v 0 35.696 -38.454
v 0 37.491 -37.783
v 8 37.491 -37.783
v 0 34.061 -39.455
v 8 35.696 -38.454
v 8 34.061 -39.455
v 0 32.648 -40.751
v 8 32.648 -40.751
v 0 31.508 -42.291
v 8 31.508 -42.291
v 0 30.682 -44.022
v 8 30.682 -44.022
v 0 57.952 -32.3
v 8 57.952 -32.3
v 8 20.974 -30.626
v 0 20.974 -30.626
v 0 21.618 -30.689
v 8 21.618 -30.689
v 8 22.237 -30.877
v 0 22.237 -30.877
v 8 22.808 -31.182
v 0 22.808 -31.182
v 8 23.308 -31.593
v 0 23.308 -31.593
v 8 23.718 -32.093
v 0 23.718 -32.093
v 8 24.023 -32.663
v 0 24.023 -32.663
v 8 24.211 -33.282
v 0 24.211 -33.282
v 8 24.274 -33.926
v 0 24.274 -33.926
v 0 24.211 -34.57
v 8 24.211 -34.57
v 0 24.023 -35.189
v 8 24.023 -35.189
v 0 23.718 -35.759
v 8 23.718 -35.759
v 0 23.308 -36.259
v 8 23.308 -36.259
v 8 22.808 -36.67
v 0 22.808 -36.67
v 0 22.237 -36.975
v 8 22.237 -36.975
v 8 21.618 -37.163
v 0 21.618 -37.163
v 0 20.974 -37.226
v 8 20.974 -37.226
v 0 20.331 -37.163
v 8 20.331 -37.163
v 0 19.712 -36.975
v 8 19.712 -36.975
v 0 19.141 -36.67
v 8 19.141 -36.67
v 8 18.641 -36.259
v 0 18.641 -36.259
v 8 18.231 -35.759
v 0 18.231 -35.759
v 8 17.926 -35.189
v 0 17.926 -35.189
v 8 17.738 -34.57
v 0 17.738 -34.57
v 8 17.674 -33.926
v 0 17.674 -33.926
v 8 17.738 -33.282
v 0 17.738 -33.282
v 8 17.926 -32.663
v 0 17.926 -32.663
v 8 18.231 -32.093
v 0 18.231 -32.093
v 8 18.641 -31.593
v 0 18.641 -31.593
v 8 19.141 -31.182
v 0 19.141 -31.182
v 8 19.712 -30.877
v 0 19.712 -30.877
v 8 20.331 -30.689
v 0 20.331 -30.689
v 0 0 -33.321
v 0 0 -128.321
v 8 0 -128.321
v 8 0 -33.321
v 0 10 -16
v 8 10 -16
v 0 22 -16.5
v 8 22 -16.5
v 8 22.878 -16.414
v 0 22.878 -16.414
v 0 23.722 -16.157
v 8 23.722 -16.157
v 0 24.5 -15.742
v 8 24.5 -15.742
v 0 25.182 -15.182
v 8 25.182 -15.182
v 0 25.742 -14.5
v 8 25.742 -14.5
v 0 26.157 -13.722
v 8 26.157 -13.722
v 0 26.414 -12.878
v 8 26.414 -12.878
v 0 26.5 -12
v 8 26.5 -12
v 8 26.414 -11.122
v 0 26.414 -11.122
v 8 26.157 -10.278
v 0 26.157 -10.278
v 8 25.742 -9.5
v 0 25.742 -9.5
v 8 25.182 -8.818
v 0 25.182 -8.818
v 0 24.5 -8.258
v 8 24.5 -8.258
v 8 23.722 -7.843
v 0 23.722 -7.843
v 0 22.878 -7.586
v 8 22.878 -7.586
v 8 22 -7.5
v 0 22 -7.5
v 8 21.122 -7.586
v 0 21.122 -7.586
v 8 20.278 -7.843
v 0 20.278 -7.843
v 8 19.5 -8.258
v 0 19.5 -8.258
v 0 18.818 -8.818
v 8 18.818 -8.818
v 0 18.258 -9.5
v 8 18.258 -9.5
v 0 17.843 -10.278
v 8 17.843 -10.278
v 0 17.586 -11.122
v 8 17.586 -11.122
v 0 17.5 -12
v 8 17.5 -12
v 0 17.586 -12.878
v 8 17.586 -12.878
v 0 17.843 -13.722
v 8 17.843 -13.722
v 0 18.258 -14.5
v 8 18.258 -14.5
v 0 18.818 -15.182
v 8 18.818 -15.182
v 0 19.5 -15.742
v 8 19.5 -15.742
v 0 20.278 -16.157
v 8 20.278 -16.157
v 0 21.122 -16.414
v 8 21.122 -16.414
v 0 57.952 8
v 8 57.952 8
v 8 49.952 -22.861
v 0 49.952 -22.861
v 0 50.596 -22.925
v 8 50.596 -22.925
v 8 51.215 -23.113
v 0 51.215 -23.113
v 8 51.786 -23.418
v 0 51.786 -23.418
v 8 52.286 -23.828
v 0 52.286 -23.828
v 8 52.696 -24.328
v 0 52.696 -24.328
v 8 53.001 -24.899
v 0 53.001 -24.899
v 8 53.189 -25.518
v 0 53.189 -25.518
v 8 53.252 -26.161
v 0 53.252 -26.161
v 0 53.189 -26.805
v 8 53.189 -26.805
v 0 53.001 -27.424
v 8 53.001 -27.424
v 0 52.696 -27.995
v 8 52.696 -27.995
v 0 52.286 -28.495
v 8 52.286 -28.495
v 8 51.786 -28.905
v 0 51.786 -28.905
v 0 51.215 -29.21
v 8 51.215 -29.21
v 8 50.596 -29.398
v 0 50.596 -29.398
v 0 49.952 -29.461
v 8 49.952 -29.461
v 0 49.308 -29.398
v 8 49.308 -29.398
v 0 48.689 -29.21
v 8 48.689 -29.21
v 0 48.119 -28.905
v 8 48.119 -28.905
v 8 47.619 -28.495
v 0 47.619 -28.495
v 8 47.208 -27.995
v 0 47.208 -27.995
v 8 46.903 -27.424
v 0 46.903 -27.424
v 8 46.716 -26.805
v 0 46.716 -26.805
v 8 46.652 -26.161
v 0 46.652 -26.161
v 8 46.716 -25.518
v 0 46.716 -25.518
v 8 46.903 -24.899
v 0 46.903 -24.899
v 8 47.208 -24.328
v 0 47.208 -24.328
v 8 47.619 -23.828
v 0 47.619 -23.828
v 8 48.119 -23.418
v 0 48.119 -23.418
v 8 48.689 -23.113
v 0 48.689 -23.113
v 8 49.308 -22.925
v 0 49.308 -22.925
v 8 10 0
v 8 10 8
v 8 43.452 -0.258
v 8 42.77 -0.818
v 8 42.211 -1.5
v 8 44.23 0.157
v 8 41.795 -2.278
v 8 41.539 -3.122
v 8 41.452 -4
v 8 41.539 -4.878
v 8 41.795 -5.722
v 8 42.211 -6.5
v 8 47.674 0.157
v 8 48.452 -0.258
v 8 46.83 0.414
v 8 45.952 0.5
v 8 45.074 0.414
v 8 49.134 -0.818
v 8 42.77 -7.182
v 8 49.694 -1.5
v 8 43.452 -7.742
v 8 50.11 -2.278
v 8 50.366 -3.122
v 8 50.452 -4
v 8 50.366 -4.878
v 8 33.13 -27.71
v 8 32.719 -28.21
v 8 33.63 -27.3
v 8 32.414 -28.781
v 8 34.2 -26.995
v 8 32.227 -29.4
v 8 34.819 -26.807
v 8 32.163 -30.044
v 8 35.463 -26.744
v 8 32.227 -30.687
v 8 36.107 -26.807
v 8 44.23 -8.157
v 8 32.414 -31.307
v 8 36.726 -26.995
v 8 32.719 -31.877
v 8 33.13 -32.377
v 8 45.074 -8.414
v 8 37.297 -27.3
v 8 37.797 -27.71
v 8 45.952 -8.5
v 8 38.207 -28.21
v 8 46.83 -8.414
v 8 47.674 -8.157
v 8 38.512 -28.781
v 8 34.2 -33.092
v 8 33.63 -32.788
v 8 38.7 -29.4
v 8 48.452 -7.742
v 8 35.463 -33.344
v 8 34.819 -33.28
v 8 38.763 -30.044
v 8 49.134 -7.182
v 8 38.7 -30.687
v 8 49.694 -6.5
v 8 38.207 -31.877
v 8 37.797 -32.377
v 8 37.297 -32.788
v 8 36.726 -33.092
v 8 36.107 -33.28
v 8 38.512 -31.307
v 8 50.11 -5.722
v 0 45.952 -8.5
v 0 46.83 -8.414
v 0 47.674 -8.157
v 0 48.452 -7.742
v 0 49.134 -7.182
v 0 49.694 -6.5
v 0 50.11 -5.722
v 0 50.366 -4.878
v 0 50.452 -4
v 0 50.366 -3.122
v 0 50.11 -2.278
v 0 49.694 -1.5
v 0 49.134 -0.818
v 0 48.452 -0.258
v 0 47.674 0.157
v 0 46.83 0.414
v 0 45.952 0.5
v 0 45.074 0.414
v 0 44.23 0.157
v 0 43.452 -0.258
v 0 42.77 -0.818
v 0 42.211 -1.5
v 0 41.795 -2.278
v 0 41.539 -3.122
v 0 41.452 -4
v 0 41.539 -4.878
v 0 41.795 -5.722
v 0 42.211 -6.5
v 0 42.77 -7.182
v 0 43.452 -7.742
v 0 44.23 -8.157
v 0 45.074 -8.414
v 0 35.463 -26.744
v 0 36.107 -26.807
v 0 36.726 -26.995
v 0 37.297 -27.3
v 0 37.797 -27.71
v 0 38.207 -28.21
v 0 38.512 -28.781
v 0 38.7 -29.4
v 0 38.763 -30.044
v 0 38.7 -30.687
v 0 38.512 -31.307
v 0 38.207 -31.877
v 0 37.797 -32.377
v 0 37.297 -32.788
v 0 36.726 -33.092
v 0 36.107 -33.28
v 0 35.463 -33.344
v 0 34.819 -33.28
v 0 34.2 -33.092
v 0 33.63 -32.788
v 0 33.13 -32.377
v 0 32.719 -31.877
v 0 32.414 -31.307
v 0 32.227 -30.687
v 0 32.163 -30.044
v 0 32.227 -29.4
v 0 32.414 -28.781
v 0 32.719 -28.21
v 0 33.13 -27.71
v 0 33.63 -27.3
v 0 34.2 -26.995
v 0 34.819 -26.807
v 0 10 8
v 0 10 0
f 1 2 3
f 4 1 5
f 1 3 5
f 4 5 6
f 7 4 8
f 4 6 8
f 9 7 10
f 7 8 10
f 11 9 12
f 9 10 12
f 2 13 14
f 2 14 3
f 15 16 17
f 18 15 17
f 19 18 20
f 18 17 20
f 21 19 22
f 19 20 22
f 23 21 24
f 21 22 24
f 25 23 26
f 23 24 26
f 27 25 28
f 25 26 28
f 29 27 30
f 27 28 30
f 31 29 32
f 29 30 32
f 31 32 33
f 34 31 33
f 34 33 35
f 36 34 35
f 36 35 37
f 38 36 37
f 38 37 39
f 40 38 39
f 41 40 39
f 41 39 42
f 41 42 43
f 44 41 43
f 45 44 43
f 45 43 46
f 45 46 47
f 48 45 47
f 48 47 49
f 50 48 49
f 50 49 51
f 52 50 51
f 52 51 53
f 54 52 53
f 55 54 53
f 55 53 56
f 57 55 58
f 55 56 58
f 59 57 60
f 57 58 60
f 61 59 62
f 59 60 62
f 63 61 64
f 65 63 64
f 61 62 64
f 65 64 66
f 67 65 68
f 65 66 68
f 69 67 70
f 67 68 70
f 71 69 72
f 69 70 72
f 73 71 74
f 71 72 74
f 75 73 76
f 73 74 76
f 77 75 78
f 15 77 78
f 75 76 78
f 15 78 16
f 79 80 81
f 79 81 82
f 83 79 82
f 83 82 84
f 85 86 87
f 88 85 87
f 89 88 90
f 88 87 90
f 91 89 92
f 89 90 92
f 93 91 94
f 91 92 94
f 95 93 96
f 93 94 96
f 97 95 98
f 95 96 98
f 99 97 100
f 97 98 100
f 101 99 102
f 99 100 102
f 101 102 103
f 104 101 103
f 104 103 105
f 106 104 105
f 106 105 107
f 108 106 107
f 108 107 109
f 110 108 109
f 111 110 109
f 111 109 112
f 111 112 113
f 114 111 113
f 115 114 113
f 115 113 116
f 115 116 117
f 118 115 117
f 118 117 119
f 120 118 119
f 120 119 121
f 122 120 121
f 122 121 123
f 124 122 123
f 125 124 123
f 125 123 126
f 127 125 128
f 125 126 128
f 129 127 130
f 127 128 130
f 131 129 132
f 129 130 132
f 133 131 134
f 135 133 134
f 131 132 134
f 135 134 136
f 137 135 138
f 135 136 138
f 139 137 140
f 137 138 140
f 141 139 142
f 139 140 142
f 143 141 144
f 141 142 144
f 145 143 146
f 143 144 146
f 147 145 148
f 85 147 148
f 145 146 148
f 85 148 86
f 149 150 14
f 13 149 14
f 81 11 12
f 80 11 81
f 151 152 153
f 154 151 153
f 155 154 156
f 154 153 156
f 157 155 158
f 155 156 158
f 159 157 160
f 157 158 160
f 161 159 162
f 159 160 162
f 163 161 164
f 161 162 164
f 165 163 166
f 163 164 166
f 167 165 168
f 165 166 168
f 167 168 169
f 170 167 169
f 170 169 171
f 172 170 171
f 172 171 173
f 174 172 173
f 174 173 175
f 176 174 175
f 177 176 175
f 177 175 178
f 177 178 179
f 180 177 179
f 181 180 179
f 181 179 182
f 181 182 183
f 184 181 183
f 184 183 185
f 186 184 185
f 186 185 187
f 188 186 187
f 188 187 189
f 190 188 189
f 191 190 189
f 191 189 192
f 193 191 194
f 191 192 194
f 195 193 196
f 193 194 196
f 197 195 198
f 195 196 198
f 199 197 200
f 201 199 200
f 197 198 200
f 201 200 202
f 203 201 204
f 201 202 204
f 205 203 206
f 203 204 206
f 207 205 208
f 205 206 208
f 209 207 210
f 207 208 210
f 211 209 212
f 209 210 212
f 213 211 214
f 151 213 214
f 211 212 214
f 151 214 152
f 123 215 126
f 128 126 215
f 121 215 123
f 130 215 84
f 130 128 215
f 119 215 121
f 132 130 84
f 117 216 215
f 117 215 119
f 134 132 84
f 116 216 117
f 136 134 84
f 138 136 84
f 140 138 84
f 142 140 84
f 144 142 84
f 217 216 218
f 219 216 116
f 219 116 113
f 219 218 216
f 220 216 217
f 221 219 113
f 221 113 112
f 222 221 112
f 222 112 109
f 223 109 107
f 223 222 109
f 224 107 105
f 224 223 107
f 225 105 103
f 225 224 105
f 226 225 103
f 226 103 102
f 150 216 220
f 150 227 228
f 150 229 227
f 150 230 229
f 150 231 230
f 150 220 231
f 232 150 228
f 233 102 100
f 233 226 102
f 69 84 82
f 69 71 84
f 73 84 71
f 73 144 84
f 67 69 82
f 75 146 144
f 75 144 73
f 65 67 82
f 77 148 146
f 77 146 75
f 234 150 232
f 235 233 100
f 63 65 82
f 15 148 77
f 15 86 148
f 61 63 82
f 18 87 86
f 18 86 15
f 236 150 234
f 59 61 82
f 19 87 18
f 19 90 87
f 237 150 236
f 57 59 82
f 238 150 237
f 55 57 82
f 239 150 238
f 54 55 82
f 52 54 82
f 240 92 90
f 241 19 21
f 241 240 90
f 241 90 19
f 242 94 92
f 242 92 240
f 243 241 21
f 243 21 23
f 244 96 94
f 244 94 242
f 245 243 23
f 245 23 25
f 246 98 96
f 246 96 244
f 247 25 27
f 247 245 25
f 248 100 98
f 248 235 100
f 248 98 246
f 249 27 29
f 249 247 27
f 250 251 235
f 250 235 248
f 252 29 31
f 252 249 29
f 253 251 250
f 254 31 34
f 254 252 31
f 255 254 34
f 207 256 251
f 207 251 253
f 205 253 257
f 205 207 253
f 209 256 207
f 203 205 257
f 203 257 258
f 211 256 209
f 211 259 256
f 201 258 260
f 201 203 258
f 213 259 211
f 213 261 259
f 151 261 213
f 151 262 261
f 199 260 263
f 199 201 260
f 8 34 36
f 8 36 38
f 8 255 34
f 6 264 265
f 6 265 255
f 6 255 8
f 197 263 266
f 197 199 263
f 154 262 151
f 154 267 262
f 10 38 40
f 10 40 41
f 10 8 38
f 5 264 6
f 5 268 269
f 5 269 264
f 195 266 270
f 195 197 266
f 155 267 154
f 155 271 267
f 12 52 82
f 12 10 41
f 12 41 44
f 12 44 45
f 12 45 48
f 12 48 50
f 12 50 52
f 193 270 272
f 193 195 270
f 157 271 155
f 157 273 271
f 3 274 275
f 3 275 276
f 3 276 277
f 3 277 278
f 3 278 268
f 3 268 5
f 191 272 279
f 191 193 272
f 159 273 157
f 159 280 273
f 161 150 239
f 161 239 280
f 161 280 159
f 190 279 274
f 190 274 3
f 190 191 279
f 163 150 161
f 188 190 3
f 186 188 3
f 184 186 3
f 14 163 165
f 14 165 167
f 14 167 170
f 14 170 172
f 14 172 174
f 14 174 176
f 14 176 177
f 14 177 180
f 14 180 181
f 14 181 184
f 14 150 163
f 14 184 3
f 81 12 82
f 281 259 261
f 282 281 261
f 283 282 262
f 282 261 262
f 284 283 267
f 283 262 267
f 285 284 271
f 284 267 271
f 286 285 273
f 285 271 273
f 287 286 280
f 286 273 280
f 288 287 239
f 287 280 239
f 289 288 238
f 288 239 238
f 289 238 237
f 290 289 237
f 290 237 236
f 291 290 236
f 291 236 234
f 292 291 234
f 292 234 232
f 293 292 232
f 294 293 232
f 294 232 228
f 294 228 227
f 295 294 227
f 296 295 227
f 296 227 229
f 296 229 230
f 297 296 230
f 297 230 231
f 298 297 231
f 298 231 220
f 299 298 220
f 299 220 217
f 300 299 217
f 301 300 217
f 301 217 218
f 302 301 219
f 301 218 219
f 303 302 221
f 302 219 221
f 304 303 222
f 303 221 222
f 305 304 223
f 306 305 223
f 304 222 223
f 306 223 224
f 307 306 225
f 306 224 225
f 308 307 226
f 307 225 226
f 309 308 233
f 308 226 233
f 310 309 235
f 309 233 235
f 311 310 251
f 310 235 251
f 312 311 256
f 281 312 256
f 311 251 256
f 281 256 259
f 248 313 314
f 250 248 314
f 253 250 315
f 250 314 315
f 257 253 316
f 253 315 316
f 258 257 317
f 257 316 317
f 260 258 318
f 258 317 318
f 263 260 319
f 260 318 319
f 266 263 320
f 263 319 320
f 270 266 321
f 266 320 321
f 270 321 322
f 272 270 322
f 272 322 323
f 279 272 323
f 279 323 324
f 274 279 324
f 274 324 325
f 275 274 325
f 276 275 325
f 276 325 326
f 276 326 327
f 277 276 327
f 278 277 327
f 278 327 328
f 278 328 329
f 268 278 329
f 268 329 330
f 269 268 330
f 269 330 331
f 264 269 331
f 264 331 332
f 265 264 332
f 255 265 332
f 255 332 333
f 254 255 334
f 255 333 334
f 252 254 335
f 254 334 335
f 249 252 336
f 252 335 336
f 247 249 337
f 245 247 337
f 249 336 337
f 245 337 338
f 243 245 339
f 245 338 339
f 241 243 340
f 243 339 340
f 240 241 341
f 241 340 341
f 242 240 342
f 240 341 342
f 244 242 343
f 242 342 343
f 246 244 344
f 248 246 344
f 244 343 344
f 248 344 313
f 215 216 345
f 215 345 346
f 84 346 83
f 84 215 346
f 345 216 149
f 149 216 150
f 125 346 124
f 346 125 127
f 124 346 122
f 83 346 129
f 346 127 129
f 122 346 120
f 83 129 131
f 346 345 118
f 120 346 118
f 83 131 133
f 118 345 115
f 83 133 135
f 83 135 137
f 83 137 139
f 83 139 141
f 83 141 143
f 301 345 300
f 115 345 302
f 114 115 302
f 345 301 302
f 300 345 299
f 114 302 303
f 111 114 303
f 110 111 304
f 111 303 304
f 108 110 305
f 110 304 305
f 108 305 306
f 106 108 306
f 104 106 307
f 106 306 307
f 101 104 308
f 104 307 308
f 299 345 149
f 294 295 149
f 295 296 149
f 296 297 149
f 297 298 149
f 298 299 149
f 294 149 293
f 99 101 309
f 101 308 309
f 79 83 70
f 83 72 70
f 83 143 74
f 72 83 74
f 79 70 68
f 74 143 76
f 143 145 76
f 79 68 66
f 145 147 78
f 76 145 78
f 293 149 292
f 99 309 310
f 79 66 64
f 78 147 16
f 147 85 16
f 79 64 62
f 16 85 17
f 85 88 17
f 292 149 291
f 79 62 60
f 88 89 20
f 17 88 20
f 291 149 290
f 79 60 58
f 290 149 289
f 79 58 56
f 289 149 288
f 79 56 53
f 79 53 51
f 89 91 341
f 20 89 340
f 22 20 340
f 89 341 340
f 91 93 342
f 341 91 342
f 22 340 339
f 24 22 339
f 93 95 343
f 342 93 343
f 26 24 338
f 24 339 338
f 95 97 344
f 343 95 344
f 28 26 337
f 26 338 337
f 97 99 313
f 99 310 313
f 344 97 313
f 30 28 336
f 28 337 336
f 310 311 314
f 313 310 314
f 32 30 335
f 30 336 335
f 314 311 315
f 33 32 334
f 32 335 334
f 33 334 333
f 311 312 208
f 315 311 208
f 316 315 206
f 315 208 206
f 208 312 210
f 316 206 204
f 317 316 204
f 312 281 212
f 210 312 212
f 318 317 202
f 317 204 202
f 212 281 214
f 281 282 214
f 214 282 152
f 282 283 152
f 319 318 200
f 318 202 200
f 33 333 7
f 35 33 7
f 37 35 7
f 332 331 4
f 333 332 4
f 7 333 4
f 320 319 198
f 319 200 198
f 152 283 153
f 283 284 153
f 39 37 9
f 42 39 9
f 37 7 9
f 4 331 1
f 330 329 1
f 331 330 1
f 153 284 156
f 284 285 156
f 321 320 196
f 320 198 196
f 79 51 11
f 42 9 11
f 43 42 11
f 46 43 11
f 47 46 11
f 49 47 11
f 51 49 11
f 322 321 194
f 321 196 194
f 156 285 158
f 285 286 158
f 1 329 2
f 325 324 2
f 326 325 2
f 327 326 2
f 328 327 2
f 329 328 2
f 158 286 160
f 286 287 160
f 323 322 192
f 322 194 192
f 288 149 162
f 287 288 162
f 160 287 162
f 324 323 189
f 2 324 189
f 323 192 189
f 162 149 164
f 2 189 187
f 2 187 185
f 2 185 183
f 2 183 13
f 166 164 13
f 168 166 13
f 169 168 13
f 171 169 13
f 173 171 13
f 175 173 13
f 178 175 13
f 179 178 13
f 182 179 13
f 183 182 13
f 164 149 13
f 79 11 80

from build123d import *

# Parameters (mm, degrees)
RESSALTO_EXTRUS_O1_DEPTH = 8
ESBO_O2_W                = 32.3
ESBO_O2_H                = 16.047818473
CORTE_EXTRUS_O1_DEPTH    = 149.344709352
ESBO_O3_W                = 8
ESBO_O3_H                = 47.952181527
RESSALTO_EXTRUS_O2_DEPTH = 8
FURO_COM_FOLGA_DE_M81_D  = 9
FURO_COM_FOLGA_DE_M61_D  = 6.6
FILETE1_R                = 10


with BuildPart() as part:
    # Esboço1 → Ressalto-extrusão1 (new body)
    with BuildSketch(Plane(origin=(0, 0, 0), x_dir=(0, 0, -1), z_dir=(1, 0, 0))):
        Polygon((28, 74), (39.129876604, 32.462735031), (128.320508076, 0), (33.320508076, 0), (16, 10), (0, 10), (0, 74), align=None)
    extrude(amount=RESSALTO_EXTRUS_O1_DEPTH)

    # Esboço2 → Corte-extrusão1 (cut, through all)
    with BuildSketch(Plane(origin=(8, 0, 0), x_dir=(0, 0, -1), z_dir=(1, 0, 0))):
        with Locations((16.15, 65.976090763)):
            Rectangle(ESBO_O2_W, ESBO_O2_H)
    extrude(amount=-CORTE_EXTRUS_O1_DEPTH, mode=Mode.SUBTRACT)

    # Esboço3 → Ressalto-extrusão2 (add)
    with BuildSketch(Plane(origin=(8, 0, 0), x_dir=(0, 0, -1), z_dir=(1, 0, 0))):
        with Locations((-4, 33.976090763)):
            Rectangle(ESBO_O3_W, ESBO_O3_H)
    extrude(amount=-RESSALTO_EXTRUS_O2_DEPTH)

    # Furo com folga de M81 (through all)
    with Locations(Plane.ZY):
        with Locations((-4, 45.952181527), (-12, 22)):
            Hole(FURO_COM_FOLGA_DE_M81_D / 2)

    # Furo com folga de M61 (through all)
    with Locations(Plane(origin=(8, 0, 0), x_dir=(0, 0, -1), z_dir=(1, 0, 0))):
        with Locations((26.161384096, 49.952181527), (30.043669773, 35.463294133), (33.925955449, 20.974406739)):
            Hole(FURO_COM_FOLGA_DE_M61_D / 2)

    # Filete1
    filete1_edges = [part.edges().sort_by_distance(p)[0] for p in [
        (4, 32.462735031, -39.129876604),
    ]]
    fillet(filete1_edges, radius=FILETE1_R)


solid = part.part
